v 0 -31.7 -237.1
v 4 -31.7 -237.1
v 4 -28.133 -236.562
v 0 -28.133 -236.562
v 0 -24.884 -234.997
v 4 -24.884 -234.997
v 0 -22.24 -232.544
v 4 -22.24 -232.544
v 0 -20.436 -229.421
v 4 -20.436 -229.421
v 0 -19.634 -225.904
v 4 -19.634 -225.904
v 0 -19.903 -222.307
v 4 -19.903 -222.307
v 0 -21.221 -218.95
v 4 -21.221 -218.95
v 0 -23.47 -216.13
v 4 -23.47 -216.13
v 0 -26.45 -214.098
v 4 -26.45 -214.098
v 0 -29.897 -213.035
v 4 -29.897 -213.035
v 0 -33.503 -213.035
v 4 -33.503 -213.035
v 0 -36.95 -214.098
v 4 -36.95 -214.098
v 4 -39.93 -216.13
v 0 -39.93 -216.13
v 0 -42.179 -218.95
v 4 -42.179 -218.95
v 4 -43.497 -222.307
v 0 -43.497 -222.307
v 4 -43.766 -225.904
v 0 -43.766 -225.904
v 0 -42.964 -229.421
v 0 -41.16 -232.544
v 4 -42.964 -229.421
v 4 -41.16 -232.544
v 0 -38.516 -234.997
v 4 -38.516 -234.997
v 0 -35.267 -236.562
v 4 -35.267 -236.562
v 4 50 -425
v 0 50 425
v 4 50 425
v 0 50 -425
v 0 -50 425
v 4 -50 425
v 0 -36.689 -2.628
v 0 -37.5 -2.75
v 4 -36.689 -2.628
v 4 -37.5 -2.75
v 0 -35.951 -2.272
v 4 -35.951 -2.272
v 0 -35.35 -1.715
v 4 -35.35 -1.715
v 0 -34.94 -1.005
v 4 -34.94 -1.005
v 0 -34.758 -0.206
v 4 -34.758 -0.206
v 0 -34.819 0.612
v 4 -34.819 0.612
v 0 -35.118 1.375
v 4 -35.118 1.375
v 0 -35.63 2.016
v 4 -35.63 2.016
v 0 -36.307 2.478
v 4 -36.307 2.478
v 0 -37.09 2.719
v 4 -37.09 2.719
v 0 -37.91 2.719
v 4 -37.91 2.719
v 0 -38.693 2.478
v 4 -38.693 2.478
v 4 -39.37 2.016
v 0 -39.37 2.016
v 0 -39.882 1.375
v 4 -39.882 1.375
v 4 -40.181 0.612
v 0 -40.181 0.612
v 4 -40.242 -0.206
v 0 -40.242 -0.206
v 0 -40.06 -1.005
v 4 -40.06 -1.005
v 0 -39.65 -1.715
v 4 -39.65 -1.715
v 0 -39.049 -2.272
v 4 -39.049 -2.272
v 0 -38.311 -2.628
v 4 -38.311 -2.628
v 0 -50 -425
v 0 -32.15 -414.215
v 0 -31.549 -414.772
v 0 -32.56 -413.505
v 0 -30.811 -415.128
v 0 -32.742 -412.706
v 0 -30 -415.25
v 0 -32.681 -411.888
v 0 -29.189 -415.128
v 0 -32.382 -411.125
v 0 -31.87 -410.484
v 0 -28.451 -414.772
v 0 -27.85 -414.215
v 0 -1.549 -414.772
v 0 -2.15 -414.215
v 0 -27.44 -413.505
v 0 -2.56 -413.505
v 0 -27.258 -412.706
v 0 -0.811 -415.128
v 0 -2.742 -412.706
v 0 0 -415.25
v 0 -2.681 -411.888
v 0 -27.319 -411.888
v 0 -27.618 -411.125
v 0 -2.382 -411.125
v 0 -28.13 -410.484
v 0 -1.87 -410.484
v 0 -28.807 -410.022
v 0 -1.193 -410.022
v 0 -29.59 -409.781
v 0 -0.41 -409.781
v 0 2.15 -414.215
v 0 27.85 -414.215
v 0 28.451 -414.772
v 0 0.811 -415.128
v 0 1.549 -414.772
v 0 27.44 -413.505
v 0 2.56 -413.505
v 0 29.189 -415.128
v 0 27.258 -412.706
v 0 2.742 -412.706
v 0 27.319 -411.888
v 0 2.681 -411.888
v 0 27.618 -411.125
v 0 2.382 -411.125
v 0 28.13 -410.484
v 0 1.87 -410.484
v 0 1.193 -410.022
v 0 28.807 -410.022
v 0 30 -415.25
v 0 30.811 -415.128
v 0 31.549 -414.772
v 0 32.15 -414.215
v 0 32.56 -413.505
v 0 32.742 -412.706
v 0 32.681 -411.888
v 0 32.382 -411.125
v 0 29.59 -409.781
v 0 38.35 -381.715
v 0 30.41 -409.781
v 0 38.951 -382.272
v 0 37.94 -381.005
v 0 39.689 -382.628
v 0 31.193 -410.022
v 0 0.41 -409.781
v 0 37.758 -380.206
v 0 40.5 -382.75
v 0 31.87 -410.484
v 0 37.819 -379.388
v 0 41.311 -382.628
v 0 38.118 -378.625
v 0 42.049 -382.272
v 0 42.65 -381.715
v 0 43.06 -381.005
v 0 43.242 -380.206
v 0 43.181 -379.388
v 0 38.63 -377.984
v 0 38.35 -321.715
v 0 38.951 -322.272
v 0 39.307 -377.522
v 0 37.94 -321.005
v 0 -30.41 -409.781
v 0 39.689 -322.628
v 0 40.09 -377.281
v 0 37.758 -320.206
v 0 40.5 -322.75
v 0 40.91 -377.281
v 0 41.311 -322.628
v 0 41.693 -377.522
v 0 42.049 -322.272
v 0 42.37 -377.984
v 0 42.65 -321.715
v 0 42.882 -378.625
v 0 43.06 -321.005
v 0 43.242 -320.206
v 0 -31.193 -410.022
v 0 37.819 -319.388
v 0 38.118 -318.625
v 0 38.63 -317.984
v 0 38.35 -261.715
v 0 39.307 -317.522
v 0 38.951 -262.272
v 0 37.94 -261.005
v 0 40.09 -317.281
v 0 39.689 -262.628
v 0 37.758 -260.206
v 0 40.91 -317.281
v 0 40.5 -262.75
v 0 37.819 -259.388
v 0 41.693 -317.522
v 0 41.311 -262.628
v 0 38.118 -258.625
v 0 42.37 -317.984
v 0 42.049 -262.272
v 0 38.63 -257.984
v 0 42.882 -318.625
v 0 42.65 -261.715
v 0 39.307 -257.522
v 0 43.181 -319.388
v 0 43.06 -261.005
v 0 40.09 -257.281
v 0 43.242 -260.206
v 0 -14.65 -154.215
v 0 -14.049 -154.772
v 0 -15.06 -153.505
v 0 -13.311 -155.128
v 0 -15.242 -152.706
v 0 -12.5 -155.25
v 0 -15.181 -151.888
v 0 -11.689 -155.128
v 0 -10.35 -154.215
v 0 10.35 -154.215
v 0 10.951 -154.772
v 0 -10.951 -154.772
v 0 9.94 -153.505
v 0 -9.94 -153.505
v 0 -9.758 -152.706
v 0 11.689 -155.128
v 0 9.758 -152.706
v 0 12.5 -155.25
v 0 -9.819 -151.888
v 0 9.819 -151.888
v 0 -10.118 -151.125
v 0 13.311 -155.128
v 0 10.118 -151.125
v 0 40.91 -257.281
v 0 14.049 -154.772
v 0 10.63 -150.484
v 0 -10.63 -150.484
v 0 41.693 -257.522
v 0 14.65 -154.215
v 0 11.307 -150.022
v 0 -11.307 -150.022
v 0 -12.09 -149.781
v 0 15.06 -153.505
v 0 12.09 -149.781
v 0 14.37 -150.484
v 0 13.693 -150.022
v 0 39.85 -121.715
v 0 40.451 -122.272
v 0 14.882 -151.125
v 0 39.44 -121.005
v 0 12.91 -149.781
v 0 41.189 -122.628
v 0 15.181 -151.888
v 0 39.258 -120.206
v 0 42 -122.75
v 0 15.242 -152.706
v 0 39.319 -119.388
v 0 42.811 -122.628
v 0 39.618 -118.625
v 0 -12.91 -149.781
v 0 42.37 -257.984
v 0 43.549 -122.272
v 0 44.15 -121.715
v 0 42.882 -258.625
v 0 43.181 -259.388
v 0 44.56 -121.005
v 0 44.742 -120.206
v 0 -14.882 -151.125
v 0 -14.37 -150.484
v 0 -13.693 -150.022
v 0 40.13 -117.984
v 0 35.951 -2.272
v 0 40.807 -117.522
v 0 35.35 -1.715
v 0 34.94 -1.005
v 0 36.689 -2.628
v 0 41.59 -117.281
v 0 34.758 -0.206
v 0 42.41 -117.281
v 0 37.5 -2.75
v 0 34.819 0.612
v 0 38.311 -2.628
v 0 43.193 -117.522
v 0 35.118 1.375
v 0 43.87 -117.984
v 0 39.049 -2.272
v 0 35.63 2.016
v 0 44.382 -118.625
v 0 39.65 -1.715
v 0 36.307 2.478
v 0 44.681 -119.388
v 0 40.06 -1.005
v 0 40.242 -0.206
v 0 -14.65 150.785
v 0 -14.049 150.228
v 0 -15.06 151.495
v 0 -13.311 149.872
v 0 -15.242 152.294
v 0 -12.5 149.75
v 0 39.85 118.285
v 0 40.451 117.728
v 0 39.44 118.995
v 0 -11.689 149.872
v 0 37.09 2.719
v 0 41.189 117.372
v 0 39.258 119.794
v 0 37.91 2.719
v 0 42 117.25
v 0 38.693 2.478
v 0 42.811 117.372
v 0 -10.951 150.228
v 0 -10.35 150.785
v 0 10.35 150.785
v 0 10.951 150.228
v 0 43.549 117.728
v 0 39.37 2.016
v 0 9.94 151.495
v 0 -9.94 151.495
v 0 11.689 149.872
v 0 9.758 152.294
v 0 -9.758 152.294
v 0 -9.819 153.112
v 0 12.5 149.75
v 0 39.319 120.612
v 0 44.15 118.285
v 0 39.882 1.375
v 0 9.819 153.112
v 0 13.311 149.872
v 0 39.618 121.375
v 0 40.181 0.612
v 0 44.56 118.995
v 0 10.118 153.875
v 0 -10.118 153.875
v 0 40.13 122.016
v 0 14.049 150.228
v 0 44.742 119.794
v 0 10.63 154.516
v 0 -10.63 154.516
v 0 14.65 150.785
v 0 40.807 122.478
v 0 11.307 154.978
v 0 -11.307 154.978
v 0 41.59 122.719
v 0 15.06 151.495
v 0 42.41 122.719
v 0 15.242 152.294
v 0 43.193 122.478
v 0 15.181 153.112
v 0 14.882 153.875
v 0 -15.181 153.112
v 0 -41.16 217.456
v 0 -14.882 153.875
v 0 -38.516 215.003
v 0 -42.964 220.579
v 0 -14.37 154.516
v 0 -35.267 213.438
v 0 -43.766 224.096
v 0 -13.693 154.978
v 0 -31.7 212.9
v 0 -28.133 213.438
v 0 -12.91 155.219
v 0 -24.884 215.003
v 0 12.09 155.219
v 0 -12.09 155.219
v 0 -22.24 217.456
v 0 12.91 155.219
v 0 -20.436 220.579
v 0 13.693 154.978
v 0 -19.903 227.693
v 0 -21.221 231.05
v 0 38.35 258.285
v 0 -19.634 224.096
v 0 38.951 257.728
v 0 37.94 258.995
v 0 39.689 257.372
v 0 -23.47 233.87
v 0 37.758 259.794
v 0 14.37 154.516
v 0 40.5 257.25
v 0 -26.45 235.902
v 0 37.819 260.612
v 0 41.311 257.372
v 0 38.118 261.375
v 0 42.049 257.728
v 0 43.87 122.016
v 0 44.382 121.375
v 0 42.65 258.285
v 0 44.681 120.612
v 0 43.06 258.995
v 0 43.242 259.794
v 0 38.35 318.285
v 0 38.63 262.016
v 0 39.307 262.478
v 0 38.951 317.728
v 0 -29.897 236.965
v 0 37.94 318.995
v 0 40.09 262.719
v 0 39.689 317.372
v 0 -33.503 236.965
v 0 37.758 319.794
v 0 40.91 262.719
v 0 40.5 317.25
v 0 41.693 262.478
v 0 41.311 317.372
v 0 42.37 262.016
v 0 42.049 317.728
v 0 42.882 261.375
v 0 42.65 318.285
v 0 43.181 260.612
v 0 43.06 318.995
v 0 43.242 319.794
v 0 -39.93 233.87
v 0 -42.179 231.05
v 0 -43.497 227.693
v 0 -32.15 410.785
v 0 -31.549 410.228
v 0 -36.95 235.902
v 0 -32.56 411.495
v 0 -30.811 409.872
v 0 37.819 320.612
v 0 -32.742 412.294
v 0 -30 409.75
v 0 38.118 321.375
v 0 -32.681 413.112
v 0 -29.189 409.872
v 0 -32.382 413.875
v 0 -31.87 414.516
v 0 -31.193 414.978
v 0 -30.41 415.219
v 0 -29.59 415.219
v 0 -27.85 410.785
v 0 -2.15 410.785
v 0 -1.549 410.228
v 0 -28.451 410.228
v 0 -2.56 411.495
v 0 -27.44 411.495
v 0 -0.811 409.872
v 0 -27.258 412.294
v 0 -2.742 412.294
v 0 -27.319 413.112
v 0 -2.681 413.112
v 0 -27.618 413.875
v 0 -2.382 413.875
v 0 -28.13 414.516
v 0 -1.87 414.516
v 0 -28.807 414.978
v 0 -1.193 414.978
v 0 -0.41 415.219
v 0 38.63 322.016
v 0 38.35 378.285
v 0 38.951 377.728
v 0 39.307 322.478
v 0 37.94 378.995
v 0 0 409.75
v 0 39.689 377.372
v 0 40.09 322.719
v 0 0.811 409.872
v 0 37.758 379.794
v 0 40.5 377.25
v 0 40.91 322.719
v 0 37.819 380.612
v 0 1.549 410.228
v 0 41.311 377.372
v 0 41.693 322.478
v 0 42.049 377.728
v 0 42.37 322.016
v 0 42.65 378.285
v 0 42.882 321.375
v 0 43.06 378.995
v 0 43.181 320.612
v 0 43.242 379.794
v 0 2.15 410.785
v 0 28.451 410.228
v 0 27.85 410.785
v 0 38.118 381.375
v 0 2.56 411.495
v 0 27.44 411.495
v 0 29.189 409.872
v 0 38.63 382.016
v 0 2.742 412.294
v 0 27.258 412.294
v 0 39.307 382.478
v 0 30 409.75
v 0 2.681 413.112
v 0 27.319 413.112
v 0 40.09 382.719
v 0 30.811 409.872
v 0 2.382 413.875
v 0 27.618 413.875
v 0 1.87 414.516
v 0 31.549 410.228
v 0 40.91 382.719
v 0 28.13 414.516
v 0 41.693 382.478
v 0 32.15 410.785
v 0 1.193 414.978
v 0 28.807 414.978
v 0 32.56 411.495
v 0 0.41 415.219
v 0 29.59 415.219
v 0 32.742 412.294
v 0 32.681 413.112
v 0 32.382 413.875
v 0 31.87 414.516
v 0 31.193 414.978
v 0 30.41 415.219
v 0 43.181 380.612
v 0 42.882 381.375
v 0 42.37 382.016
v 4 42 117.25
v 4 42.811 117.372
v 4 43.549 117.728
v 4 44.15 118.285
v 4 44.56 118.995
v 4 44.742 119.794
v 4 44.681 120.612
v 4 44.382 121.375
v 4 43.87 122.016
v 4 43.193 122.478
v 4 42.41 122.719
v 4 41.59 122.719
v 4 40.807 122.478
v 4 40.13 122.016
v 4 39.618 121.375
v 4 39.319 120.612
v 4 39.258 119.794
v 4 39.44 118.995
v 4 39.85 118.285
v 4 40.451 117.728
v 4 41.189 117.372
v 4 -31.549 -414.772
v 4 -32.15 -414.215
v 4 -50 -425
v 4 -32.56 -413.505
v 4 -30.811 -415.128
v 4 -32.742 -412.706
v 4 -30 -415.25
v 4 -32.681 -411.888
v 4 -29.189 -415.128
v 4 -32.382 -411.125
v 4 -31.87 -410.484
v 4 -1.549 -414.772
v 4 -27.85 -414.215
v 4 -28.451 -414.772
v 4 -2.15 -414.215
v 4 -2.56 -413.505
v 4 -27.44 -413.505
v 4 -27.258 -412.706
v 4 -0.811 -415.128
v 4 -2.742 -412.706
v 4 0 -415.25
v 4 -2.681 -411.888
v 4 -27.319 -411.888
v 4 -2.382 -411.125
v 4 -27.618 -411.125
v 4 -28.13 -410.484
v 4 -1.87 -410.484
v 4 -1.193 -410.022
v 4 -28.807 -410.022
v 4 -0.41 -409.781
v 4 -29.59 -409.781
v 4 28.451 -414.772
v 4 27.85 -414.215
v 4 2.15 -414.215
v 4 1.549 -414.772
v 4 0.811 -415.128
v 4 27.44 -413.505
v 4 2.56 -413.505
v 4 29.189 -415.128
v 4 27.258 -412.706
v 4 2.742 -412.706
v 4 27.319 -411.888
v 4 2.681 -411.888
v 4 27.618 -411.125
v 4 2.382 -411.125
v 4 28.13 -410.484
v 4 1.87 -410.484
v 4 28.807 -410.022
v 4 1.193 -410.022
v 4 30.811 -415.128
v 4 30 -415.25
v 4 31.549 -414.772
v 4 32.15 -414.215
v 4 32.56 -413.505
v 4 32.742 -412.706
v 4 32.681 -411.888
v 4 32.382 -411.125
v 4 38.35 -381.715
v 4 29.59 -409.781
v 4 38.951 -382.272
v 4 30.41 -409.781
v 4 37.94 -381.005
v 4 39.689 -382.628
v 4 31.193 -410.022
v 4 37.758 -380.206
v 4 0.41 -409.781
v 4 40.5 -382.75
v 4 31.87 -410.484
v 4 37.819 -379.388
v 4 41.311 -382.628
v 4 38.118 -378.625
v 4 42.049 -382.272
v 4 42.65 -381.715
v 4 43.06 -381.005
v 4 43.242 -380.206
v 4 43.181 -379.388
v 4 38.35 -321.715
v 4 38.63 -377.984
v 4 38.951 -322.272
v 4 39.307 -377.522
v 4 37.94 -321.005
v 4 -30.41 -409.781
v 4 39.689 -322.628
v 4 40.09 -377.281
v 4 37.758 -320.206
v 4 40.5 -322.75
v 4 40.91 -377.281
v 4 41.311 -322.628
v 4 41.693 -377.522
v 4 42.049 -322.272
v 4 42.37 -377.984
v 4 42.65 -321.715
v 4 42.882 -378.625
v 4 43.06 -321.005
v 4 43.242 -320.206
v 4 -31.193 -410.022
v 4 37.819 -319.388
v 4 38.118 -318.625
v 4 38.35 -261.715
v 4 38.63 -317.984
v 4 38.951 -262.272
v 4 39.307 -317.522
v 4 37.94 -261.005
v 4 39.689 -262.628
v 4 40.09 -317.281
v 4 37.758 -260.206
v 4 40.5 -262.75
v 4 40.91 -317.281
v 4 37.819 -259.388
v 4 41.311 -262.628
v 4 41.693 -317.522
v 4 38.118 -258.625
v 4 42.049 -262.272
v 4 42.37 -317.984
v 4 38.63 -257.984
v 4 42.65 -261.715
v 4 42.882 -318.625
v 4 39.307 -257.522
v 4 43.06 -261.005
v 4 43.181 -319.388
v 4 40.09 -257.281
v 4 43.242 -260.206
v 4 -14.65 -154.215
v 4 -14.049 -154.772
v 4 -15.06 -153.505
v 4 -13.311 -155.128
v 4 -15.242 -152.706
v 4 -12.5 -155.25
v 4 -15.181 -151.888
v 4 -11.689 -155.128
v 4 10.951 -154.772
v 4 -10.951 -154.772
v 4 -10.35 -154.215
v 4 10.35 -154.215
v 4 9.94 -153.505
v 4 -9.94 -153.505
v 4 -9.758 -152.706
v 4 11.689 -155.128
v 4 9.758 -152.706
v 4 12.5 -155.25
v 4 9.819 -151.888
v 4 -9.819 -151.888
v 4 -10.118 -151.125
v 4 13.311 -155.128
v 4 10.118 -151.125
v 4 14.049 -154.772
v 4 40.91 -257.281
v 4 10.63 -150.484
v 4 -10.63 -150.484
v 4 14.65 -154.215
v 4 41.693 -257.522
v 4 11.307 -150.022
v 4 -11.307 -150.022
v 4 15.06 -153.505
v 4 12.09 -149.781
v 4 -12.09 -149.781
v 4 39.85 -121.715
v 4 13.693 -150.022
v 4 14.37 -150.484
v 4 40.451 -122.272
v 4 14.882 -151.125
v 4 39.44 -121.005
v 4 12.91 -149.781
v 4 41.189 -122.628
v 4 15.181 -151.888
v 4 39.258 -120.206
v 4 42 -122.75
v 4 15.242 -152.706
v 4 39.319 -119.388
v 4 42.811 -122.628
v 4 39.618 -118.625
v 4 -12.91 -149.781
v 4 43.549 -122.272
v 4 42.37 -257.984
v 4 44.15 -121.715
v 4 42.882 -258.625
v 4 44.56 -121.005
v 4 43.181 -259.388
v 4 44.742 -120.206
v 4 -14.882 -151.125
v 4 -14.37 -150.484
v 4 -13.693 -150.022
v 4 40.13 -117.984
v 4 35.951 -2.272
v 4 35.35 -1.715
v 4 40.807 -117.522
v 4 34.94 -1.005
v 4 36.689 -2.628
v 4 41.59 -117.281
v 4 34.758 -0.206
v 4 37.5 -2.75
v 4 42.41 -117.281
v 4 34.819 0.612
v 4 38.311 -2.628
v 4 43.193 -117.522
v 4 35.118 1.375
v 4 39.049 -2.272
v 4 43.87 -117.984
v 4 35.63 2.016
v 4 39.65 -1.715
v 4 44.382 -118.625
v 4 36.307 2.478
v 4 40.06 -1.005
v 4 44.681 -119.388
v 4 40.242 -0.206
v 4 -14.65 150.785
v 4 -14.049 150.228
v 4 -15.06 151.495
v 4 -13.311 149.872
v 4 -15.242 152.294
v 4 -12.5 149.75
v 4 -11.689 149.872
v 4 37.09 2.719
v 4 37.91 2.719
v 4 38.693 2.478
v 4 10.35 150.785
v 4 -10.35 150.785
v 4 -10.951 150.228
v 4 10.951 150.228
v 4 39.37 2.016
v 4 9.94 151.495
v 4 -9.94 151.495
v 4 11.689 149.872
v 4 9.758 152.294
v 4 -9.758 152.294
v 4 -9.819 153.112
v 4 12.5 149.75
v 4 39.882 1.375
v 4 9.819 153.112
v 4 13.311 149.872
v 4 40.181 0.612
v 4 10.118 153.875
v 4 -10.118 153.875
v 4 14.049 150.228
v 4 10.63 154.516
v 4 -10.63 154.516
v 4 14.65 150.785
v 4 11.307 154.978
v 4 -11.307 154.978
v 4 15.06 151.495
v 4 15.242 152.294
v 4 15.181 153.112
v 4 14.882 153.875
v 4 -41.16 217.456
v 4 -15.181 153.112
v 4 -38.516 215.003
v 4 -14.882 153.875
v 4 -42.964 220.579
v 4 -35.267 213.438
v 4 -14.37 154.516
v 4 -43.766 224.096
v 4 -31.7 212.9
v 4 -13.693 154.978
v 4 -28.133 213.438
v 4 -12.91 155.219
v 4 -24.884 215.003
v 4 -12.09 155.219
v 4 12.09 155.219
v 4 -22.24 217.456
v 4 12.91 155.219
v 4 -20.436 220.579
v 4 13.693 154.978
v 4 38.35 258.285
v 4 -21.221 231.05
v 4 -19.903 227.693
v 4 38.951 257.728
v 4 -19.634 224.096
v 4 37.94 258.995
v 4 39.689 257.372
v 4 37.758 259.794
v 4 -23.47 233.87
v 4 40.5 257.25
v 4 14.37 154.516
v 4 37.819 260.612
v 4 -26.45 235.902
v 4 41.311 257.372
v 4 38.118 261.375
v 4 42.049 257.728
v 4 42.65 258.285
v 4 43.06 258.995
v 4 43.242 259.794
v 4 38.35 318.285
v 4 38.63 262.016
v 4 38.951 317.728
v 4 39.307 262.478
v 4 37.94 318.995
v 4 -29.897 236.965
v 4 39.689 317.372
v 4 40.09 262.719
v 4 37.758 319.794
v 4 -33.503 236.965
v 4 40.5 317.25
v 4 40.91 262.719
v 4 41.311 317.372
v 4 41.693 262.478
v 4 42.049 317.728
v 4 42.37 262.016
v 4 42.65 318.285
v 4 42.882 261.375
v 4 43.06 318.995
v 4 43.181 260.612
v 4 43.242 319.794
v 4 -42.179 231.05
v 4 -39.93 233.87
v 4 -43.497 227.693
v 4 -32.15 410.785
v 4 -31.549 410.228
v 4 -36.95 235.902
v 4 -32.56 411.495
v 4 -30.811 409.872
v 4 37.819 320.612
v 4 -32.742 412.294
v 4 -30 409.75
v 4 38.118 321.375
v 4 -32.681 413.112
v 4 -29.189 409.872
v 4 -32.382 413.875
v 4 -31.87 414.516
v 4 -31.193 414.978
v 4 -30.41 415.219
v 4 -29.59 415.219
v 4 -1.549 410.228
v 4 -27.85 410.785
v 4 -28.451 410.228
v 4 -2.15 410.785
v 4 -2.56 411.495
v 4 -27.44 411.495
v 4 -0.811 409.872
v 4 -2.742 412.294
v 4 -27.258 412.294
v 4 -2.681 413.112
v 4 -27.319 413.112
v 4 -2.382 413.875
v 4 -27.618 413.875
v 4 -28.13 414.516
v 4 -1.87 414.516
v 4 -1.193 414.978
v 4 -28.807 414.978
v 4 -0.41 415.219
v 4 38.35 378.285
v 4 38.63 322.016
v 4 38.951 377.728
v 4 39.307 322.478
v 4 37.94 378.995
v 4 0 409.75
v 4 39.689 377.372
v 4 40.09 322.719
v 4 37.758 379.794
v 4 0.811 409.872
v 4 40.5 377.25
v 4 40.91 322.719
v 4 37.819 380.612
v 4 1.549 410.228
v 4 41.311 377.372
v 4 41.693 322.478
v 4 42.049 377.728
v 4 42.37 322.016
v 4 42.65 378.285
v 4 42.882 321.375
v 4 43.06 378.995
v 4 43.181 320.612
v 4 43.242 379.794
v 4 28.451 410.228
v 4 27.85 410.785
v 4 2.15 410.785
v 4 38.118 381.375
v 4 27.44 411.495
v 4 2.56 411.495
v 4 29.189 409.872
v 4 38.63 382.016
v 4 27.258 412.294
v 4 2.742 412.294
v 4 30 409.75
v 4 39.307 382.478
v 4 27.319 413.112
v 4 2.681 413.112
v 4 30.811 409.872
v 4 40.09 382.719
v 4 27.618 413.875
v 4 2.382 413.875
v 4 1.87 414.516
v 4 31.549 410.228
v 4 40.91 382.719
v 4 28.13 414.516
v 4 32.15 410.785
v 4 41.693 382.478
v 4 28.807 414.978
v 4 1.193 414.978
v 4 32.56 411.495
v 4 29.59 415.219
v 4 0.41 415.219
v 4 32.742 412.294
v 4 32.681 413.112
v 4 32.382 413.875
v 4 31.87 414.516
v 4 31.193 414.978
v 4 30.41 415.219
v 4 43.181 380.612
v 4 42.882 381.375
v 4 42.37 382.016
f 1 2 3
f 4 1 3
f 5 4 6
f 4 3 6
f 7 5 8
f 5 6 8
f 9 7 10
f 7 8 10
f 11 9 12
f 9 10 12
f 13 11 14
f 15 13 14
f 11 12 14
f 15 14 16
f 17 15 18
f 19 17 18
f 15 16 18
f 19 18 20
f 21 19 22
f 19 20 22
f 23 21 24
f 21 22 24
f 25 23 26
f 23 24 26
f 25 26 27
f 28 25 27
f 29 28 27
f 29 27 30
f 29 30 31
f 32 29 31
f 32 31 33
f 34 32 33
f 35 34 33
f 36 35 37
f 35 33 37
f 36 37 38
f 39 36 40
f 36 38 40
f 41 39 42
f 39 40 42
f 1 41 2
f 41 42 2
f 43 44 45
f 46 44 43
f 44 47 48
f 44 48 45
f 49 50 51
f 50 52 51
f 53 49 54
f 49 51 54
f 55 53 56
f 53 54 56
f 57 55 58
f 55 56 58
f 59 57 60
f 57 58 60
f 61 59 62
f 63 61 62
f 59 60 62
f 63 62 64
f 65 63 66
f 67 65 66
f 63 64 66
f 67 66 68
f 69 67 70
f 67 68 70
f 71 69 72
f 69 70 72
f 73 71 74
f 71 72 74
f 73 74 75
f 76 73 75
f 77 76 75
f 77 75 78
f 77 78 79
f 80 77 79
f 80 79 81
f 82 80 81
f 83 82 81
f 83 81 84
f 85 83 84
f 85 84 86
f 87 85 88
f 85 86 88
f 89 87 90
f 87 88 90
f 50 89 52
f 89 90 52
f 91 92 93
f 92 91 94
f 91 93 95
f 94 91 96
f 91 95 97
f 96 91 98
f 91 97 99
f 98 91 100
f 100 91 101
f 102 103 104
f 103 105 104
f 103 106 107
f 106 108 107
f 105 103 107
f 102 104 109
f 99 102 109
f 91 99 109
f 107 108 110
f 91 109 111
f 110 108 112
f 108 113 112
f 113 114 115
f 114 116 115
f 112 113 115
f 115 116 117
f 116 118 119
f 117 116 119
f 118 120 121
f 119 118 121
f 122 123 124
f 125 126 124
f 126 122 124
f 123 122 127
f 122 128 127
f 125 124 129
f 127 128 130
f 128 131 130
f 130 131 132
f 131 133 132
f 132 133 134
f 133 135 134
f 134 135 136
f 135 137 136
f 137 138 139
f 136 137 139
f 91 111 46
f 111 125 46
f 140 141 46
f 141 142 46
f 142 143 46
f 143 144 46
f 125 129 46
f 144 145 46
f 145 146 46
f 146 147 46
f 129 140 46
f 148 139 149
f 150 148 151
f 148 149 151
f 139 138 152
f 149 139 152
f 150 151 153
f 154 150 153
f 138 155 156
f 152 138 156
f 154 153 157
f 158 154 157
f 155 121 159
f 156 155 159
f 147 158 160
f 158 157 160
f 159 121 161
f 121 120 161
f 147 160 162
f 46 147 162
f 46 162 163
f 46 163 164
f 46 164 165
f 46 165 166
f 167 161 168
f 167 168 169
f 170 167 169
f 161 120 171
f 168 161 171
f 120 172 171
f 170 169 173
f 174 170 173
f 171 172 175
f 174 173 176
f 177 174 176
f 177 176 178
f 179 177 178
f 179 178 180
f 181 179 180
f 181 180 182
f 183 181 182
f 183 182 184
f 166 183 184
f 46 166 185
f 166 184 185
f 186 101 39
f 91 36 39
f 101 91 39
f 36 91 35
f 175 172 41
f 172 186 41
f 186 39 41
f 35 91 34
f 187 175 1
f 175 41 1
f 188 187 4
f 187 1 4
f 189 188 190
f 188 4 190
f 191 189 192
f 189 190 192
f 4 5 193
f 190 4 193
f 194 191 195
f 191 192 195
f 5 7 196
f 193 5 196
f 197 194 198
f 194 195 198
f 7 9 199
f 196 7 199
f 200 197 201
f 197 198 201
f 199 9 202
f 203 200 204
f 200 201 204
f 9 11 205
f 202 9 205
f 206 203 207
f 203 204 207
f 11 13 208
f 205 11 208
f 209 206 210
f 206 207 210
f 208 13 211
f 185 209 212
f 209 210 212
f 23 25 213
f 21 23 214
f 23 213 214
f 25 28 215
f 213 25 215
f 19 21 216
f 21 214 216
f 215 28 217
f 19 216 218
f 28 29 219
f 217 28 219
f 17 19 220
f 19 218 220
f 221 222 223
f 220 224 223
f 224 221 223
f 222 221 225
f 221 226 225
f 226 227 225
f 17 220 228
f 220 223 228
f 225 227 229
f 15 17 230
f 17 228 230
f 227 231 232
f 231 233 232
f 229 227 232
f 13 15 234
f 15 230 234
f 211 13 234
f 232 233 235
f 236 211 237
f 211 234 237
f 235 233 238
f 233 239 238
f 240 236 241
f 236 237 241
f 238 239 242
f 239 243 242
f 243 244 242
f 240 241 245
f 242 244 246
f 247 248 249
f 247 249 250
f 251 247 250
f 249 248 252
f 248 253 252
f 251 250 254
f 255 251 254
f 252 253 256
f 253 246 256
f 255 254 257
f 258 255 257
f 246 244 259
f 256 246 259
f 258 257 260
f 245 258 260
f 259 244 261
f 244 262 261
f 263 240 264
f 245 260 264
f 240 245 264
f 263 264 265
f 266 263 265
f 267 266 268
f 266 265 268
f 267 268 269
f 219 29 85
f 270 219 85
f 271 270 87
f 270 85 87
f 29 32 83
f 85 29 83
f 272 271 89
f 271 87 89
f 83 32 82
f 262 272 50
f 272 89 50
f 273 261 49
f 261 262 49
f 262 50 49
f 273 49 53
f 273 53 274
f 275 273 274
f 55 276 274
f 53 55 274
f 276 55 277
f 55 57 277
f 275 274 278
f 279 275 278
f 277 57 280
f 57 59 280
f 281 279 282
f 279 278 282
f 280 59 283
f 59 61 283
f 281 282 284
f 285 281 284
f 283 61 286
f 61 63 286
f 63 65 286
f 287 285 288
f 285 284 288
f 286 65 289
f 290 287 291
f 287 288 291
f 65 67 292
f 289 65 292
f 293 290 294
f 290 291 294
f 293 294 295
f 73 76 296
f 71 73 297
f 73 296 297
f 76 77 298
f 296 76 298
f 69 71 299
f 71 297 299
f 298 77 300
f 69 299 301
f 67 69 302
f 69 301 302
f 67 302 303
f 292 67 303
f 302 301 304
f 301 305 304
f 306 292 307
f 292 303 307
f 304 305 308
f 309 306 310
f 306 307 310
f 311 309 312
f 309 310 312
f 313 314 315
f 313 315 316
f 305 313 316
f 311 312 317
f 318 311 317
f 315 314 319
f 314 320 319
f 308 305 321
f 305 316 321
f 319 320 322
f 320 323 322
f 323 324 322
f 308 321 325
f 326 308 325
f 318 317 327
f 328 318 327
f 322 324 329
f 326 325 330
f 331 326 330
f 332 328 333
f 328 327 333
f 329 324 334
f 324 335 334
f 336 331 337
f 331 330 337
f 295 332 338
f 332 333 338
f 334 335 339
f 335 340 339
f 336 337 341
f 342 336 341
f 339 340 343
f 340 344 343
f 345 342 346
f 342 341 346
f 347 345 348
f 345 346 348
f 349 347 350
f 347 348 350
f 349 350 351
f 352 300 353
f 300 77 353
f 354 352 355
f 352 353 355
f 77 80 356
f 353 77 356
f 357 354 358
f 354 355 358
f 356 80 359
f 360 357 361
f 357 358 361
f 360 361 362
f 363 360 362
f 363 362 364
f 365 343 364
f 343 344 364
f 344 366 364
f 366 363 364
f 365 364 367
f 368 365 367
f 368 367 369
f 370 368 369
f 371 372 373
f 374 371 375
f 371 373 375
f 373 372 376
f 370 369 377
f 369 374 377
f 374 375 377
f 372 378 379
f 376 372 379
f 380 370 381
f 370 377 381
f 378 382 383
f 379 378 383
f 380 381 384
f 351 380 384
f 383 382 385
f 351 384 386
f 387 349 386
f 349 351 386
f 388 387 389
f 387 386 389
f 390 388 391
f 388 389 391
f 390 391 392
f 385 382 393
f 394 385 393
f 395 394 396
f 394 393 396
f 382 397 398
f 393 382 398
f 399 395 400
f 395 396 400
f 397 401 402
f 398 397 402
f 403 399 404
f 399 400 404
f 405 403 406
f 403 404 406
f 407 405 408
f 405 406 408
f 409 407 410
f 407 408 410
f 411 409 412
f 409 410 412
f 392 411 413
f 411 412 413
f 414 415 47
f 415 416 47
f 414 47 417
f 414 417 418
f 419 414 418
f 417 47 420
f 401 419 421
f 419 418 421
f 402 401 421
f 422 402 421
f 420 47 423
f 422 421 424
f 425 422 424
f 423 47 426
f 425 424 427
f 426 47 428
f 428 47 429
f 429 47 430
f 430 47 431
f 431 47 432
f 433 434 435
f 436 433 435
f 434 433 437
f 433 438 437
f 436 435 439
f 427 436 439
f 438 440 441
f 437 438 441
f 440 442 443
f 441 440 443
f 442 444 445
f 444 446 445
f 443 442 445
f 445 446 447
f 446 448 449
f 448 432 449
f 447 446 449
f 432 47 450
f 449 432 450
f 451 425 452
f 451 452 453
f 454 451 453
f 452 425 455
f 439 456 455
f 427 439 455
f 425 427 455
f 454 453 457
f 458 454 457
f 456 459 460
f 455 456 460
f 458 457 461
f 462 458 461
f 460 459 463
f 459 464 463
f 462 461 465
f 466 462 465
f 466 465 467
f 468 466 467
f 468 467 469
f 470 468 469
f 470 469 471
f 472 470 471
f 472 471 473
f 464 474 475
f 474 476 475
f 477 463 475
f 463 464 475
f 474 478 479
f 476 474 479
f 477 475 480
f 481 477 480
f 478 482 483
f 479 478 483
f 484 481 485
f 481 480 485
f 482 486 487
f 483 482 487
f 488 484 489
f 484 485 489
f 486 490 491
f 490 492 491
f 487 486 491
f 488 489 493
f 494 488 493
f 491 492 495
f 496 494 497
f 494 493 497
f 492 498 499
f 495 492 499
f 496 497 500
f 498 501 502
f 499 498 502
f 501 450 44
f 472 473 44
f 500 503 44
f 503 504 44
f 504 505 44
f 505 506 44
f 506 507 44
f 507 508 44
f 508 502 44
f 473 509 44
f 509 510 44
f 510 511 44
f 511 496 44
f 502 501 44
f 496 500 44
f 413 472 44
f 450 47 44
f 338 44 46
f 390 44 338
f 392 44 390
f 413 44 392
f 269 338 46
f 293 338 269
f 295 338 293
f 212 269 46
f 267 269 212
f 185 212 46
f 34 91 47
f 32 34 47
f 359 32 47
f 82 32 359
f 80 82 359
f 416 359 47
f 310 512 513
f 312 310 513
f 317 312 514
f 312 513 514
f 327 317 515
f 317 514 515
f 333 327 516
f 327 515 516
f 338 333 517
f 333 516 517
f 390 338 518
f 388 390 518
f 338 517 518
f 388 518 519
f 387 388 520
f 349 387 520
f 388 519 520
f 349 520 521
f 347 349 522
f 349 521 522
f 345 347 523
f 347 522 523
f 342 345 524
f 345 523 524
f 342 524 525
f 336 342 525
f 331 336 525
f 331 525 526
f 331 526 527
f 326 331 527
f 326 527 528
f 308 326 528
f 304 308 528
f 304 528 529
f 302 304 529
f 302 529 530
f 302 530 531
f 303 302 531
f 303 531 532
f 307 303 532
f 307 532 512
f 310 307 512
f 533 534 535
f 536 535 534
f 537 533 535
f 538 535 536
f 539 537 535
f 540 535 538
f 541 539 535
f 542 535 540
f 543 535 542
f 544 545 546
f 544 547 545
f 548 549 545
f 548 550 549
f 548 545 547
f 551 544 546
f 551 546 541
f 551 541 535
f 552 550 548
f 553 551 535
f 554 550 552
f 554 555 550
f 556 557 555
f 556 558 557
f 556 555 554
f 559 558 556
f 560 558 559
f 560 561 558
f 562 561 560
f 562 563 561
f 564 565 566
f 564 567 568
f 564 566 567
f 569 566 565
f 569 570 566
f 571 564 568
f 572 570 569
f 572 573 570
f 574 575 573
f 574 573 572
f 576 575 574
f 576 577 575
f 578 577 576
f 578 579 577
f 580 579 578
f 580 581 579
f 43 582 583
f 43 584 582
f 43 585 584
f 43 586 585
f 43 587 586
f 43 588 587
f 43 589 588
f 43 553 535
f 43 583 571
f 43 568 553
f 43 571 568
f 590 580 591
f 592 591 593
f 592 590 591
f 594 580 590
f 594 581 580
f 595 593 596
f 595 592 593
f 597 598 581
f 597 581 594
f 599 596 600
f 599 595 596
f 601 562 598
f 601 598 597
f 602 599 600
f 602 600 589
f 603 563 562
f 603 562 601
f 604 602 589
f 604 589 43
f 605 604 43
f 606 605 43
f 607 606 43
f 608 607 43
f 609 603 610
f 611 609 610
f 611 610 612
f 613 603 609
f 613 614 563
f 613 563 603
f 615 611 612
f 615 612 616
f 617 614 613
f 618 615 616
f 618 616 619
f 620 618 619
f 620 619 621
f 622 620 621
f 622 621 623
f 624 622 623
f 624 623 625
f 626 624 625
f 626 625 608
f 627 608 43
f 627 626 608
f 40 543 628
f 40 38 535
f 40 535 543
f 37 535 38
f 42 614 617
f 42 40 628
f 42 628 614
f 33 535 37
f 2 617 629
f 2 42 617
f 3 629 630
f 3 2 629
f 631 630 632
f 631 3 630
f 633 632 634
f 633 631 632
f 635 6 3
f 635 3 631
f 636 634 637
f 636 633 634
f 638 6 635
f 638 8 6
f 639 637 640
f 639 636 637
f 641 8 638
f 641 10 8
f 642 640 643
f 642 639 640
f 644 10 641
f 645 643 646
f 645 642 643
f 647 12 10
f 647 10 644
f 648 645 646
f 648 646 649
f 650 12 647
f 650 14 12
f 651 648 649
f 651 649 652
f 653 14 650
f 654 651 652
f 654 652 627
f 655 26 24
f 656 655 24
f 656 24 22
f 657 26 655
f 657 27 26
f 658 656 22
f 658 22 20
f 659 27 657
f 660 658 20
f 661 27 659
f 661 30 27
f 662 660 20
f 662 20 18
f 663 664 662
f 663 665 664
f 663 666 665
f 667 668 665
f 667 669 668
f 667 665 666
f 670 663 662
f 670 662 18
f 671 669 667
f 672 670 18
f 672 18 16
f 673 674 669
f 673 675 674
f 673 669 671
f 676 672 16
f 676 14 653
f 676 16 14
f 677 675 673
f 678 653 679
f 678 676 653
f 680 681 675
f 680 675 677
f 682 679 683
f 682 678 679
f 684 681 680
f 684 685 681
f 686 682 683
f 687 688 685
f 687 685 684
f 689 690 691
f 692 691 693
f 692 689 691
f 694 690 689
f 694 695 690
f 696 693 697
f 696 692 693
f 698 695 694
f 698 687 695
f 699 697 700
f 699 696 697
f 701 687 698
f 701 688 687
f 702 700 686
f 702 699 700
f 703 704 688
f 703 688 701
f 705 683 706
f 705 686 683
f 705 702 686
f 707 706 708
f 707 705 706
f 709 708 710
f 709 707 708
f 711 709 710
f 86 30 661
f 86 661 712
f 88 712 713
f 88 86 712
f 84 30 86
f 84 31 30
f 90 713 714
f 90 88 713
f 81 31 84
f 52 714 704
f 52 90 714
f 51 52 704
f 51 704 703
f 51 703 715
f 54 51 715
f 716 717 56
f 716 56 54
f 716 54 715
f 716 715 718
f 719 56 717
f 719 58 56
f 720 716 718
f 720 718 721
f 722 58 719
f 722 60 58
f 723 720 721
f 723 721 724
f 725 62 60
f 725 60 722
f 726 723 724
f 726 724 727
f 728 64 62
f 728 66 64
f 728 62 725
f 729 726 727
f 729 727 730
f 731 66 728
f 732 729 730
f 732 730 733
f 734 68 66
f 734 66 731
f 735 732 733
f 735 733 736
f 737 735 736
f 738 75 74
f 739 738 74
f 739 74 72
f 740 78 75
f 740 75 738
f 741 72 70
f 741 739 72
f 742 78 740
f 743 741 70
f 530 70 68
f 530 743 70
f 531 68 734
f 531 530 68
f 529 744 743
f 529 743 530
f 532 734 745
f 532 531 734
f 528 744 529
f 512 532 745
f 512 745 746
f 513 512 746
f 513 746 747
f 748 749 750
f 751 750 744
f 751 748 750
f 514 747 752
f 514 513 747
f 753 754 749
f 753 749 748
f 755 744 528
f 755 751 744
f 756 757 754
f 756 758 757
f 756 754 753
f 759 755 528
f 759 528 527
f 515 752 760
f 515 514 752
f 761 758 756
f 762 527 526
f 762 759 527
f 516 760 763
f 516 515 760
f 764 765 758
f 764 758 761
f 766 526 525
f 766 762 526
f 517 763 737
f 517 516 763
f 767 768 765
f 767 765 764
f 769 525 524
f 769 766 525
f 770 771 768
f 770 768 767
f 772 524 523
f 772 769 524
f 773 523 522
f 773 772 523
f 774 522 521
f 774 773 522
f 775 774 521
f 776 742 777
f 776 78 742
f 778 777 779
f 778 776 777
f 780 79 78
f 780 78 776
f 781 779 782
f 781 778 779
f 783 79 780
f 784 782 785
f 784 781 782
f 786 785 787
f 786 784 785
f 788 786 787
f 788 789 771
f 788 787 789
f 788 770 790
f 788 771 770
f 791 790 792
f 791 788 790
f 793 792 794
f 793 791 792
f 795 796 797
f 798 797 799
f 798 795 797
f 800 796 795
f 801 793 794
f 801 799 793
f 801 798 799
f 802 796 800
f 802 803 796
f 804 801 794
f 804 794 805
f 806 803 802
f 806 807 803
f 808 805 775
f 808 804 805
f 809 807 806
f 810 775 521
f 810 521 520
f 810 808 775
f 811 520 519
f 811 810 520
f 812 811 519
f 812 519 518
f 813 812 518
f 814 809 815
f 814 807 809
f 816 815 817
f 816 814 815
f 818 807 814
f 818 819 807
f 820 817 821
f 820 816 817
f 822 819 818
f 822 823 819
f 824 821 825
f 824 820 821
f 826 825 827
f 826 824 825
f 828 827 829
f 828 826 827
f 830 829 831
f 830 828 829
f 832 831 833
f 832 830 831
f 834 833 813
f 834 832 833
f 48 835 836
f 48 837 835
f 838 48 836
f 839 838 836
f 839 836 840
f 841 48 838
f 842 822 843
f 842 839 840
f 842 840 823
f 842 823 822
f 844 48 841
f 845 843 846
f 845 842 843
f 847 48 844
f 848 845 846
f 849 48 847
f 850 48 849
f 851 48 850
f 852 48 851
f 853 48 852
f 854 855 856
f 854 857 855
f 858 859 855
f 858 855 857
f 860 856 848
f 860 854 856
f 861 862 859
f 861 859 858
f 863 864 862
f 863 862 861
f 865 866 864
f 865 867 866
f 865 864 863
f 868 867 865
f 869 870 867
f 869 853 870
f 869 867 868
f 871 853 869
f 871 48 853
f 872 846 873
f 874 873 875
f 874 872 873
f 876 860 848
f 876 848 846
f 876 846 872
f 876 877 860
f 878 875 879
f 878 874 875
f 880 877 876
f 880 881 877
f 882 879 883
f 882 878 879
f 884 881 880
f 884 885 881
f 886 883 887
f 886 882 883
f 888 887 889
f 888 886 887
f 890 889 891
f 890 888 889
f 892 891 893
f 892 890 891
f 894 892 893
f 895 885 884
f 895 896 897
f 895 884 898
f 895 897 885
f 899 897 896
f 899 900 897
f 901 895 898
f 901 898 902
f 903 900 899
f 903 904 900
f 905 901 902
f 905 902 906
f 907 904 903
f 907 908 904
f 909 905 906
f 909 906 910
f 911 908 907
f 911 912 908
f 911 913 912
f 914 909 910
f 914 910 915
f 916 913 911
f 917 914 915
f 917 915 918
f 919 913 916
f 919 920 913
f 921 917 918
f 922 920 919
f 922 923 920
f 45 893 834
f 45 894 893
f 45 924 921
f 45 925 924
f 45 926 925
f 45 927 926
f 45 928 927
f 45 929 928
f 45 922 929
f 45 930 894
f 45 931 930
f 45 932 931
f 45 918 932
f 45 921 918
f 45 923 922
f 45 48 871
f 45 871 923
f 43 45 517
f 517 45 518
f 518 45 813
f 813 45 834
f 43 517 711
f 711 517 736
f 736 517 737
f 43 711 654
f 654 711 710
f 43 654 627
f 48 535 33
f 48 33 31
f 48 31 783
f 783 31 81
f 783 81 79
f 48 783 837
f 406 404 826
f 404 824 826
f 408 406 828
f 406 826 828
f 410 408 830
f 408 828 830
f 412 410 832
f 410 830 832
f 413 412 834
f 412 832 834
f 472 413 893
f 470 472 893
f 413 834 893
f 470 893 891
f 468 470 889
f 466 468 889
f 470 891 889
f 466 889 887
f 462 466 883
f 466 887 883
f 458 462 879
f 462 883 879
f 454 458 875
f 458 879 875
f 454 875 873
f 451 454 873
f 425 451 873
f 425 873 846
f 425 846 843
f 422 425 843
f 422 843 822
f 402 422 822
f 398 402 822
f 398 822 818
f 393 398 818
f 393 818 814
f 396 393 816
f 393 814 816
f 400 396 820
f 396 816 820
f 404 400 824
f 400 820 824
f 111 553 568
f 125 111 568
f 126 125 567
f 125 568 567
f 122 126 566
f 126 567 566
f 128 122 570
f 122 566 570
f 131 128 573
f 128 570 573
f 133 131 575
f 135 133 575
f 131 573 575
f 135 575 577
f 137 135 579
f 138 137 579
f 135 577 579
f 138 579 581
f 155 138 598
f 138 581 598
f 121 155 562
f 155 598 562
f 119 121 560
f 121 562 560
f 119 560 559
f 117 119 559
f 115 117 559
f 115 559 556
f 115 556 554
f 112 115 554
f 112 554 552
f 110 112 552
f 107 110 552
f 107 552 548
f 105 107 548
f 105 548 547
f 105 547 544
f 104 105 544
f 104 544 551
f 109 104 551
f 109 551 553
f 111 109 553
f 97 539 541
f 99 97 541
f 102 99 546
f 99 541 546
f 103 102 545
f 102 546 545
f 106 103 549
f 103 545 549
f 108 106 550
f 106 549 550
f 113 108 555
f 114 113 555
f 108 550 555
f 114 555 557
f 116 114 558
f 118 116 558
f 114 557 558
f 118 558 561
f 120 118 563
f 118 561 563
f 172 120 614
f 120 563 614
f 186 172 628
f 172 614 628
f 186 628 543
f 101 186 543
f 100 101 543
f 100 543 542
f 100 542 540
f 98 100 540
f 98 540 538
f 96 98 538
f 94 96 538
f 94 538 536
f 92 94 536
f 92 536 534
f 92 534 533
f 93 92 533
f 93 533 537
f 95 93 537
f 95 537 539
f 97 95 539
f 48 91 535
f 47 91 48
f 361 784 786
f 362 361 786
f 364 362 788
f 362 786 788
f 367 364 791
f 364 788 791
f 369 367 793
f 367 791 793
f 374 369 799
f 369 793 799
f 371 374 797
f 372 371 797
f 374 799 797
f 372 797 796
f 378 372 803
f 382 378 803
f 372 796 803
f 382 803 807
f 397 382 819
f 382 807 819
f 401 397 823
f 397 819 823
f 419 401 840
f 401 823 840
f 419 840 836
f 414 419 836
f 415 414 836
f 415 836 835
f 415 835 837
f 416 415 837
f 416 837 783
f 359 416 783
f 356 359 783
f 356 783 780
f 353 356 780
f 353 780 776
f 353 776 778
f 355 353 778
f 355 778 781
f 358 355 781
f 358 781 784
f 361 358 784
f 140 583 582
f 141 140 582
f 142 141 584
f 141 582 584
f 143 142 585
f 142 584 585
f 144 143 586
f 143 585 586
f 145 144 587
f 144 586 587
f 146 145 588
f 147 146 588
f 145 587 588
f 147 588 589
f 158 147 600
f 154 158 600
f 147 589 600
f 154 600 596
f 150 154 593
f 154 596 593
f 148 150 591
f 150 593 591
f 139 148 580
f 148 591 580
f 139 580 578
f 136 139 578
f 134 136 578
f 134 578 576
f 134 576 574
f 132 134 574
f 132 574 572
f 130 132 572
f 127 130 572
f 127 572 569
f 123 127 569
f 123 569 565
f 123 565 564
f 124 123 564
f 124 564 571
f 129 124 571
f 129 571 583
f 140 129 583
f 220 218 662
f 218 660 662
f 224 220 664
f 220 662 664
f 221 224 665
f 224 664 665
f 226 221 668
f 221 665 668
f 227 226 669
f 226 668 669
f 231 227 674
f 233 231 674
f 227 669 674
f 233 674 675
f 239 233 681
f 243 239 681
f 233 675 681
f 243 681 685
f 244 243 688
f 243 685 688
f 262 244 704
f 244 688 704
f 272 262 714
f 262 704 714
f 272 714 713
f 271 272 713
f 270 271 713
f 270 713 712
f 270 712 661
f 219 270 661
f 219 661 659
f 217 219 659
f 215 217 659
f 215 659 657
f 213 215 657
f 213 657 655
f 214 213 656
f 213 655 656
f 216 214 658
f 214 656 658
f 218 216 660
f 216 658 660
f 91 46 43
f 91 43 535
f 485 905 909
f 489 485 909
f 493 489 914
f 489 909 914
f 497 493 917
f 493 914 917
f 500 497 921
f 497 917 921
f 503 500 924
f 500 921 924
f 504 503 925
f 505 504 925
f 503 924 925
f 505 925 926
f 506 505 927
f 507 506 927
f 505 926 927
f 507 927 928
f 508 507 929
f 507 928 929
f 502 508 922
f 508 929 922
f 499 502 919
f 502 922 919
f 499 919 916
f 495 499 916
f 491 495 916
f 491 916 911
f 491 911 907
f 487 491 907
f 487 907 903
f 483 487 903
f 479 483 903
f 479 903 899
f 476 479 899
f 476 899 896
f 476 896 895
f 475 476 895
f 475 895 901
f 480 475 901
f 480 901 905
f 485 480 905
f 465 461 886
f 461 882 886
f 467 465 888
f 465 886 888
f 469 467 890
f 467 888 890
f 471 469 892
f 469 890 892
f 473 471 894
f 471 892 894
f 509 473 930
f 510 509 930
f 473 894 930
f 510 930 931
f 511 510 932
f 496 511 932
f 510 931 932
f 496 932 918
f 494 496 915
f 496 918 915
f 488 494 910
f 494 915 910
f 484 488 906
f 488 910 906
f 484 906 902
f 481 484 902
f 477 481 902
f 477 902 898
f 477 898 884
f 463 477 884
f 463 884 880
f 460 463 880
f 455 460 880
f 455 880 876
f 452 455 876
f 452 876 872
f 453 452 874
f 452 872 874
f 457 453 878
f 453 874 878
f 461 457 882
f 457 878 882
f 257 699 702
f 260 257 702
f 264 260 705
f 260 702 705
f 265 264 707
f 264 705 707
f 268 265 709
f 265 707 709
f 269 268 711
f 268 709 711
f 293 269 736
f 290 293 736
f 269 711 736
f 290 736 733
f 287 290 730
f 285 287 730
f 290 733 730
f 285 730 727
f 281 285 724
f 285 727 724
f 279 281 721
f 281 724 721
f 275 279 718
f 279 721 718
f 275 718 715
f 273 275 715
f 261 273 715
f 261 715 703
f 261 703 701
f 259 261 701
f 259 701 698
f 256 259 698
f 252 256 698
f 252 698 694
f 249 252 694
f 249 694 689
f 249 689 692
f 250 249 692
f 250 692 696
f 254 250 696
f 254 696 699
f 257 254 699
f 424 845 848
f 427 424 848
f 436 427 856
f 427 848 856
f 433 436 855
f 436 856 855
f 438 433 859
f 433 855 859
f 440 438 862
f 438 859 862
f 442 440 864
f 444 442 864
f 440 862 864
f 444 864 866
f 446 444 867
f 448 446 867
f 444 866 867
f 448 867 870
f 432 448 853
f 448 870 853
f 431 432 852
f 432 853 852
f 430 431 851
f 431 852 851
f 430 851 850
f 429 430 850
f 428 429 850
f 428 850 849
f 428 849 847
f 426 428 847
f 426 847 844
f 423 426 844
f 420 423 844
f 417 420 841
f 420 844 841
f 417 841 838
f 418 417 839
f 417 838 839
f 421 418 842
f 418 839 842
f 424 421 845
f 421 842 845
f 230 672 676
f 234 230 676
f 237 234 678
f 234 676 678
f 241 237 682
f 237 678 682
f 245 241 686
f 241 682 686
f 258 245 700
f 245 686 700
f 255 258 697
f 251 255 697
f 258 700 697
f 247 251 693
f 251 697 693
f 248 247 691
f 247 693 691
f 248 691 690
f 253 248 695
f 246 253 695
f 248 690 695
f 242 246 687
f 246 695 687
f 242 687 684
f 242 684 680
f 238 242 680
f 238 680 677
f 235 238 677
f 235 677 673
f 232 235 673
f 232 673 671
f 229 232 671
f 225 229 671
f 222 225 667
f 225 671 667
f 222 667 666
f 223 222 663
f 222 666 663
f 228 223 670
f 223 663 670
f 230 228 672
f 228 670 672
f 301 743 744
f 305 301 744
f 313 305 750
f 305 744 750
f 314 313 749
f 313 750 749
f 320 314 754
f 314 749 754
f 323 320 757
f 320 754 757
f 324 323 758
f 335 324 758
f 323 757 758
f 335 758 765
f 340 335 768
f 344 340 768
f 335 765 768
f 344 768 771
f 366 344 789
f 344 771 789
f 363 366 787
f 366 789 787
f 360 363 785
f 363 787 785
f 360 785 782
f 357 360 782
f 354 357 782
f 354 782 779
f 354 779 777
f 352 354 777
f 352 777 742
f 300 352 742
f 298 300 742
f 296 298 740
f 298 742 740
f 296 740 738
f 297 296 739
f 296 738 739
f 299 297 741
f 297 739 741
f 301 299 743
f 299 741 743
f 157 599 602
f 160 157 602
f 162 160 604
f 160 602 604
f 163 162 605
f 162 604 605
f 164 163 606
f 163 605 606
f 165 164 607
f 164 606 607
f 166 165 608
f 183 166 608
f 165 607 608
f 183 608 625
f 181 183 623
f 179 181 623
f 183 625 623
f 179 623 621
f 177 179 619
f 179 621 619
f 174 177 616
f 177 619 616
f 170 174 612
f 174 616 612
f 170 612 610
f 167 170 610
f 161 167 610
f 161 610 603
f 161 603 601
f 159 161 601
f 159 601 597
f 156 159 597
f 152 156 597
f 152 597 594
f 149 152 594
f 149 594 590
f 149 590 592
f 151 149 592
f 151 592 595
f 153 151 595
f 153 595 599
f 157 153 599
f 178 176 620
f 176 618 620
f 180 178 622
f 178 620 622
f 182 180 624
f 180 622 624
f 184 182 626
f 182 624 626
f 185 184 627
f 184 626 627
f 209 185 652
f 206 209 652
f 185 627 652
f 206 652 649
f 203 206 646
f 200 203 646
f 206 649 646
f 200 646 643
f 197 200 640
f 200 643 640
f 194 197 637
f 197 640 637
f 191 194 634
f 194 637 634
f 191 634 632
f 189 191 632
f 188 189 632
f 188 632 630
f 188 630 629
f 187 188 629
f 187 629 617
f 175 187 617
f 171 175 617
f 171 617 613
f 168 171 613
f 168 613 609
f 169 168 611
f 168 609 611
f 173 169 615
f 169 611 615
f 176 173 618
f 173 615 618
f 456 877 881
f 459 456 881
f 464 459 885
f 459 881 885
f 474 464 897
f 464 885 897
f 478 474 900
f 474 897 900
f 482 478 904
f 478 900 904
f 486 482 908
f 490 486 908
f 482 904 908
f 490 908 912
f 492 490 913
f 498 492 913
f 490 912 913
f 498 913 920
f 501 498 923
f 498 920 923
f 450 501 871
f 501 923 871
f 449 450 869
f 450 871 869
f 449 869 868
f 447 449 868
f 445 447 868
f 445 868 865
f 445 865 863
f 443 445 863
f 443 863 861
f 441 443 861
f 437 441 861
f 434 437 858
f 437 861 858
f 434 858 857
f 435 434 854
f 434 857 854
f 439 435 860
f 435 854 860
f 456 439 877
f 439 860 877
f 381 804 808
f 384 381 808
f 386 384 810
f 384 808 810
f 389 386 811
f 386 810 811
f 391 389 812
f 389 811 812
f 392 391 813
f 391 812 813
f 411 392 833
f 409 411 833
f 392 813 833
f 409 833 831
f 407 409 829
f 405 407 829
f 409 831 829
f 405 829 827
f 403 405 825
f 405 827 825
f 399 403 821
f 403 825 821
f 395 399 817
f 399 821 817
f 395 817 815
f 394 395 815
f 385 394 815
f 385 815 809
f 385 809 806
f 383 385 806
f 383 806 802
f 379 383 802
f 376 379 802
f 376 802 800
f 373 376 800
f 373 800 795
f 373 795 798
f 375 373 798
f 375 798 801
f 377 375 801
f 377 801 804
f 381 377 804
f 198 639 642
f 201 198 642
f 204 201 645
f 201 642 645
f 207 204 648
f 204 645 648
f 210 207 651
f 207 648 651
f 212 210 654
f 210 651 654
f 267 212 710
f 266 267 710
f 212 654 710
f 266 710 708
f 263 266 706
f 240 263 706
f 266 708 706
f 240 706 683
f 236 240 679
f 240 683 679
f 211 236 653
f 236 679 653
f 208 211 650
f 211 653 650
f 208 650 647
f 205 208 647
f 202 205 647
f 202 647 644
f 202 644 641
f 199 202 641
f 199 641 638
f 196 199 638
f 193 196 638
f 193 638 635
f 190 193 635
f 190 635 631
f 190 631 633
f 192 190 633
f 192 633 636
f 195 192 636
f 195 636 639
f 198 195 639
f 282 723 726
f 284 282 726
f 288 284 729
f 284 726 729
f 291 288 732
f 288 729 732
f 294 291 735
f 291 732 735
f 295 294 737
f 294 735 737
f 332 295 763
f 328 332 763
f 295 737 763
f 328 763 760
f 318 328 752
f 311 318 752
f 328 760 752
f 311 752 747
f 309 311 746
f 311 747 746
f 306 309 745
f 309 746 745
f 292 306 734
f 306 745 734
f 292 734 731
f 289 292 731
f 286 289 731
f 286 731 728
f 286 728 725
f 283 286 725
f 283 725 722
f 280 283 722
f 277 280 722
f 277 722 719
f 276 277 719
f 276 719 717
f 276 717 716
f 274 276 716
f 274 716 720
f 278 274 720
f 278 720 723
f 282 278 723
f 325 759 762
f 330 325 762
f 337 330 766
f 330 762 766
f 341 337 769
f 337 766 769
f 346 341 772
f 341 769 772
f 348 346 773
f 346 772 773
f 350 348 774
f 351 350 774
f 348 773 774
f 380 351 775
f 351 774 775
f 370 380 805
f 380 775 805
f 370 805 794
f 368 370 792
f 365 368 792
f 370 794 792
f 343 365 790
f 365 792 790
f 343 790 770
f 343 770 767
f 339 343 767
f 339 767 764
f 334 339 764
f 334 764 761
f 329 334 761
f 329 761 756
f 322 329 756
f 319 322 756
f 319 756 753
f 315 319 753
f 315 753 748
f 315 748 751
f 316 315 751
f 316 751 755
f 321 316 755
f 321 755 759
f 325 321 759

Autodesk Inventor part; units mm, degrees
ref_plane "YZ Plane" through (0, 0, 0) normal (1, 0, 0) x (0, 1, 0)
ref_plane "XZ Plane" through (0, 0, 0) normal (0, 1, 0) x (-1, 0, 0)
ref_plane "XY Plane" through (0, 0, 0) normal (0, 0, 1) x (1, 0, 0)
sketch "Sketch1" plane through (0, 0, 0) normal (1, 0, 0) x (0, 1, 0)
  line L0 (-50, 425) -> (50, 425)
  line L1 (50, 425) -> (50, -425)
  line L2 (50, -425) -> (-50, -425)
  line L3 (-50, -425) -> (-50, 425)
  line L4 (-50, 425) -> (50, -425) construction
  line L5 (50, 425) -> (-50, -425) construction
  point P0 (0, 0)
  dimension "d0" = 100
  dimension "d1" = 850
extrude "Extrusion1" add sketch "Sketch1" along normal blind 4
sketch "Sketch2" plane through (4, 0, 0) normal (1, 0, 0) x (0, 0, -1)
  circle A0 centre (-225, -31.7) radius 12.1
  line L0 (-425, -50) -> (425, -50) projected
  line L1 (-425, 50) -> (-425, -50) projected
  line L2 (425, 50) -> (-425, 50) projected
  line L3 (0, 50) -> (0, -50)
  circle A1 centre (225, -31.7) radius 12.1
  point P0 (0, 0)
  dimension "d4" = 18.3
  dimension "d5" = 200
  dimension "d6" = 24.2
  dimension "d9" = 425
extrude "Extrusion2" cut sketch "Sketch2" against normal through all contours A0 | A1
sketch "Sketch3" plane through (4, 0, 0) normal (1, 0, 0) x (0, 0, -1)
  circle A0 centre (120, -42) radius 2.75 projected
  circle A1 centre (120, 42) radius 2.75 projected
  circle A2 centre (0, 37.5) radius 2.75 projected
  circle A3 centre (412.5, 30) radius 2.75 projected
  circle A4 centre (412.5, 0) radius 2.75 projected
  circle A5 centre (412.5, -30) radius 2.75 projected
  circle A6 centre (260, 40.5) radius 2.75 projected
  circle A7 centre (320, 40.5) radius 2.75 projected
  circle A8 centre (145.213, 6.296) radius 10.5 projected
  circle A9 centre (196.913, 6.296) radius 10.5 projected
  circle A10 centre (-145.213, 6.296) radius 10.5 projected
  circle A11 centre (-196.913, 6.296) radius 10.5 projected
  circle A12 centre (-105, -14) radius 10 projected
  circle A13 centre (-79.6, -14) radius 2.75 projected
  circle A14 centre (-130.4, -14) radius 2.75 projected
  circle A15 centre (-264.9997, -22.6996) radius 2.75 projected
  circle A16 centre (-147.163, -33.4172) radius 2.75 projected
  circle A17 centre (264.9997, -22.6996) radius 2.75 projected
  circle A18 centre (174.913, 42.776) radius 2.75 projected
  circle A19 centre (147.163, -33.4172) radius 2.75 projected
  circle A20 centre (130.4, -14) radius 2.75 projected
  circle A21 centre (79.6, -14) radius 2.75 projected
  circle A22 centre (105, 11.4) radius 2.75 projected
  circle A23 centre (105, -39.4) radius 2.75 projected
  circle A24 centre (111.5777, 29.8129) radius 2.75 projected
  circle A25 centre (236.913, 19.219) radius 2.75 projected
  circle A26 centre (-236.913, 19.219) radius 2.75 projected
  circle A27 centre (-174.913, 42.776) radius 2.75 projected
  circle A28 centre (-111.5777, 29.8129) radius 2.75 projected
  circle A29 centre (-105, 11.4) radius 2.75 projected
  circle A30 centre (-105, -39.4) radius 2.75 projected
  circle A31 centre (241, -31.7) radius 2.25 projected
  circle A32 centre (-241, -31.7) radius 2.25 projected
  circle A33 centre (-209, -31.7) radius 2.25 projected
  circle A34 centre (-225, -15.7) radius 2.25 projected
  circle A35 centre (225, -15.7) radius 2.25 projected
  circle A36 centre (209, -31.7) radius 2.25 projected
  circle A37 centre (-225, -31.7) radius 12.3 projected
  circle A38 centre (225, -31.7) radius 12.3 projected
  line L0 (-425, 50) -> (-425, -50) projected
  line L1 (-425, 50) -> (425, 50) projected
  line L2 (425, -50) -> (425, 50) projected
  line L3 (-425, -50) -> (425, -50) projected
  circle A39 centre (-152.5, 12.5) radius 2.75 projected
  circle A40 centre (152.5, 12.5) radius 2.75 projected
  circle A41 centre (152.5, -12.5) radius 2.75 projected
  circle A42 centre (-152.5, -12.5) radius 2.75 projected
  circle A43 centre (0, -37.5) radius 2.75 projected
  circle A44 centre (320, 40.5) radius 2.75 projected
  circle A45 centre (260, 40.5) radius 2.75 projected
  circle A46 centre (0, 37.5) radius 2.75 projected
  circle A47 centre (120, 42) radius 2.75 projected
  circle A48 centre (380, 40.5) radius 2.75 projected
  circle A49 centre (412.5, 0) radius 2.75 projected
  circle A50 centre (412.5, -30) radius 2.75 projected
  circle A51 centre (-264.9997, -22.6996) radius 2.75 projected
  circle A52 centre (-147.163, -33.4172) radius 2.75 projected
  circle A53 centre (264.9997, -22.6996) radius 2.75 projected
  circle A54 centre (174.913, 42.776) radius 2.75 projected
  circle A55 centre (147.163, -33.4172) radius 2.75 projected
  circle A56 centre (111.5777, 29.8129) radius 2.75 projected
  circle A57 centre (236.913, 19.219) radius 2.75 projected
  circle A58 centre (-236.913, 19.219) radius 2.75 projected
  circle A59 centre (-174.913, 42.776) radius 2.75 projected
  circle A60 centre (-111.5777, 29.8129) radius 2.75 projected
  circle A61 centre (225, -31.7) radius 16.3 projected
  circle A62 centre (-225, -31.7) radius 16.3 projected
  line L4 (-425, -50) -> (-425, 50) projected
  line L5 (-425, -50) -> (425, -50) projected
  line L6 (425, 50) -> (425, -50) projected
  line L7 (-425, 50) -> (425, 50) projected
  circle A63 centre (-120, 42) radius 2.75 projected
  circle A64 centre (-105, -14) radius 34 projected
  circle A65 centre (75.0667, -42) radius 2.75 projected
  circle A66 centre (105, -14) radius 34 projected
  circle A67 centre (152.5, -12.5) radius 7.5 projected
  circle A68 centre (-152.5, -12.5) radius 7.5 projected
  circle A69 centre (-85.6, 40) radius 2.75 projected
  circle A70 centre (15.6, 40) radius 2.75 projected
  circle A71 centre (364.4, 40) radius 2.75 projected
  circle A72 centre (364.5, -40) radius 2.75 projected
  circle A73 centre (15.6, -40) radius 2.75 projected
  circle A74 centre (-85.6, -40) radius 2.75 projected
  arc A75 (-119.576, -44.7171) -> (-92.3554, -45.5613) centre (-105, -14) ccw projected
  circle A76 centre (15.6, -40) radius 8.75 projected
  circle A77 centre (-85.6, 40) radius 8.75 projected
  circle A78 centre (15.6, 40) radius 8.75 projected
  circle A79 centre (364.5, -40) radius 8.75 projected
  arc A80 (-92.3554, -45.5613) -> (-78.3455, -35.1077) centre (-85.6, -40) ccw projected
  circle A81 centre (105, -14) radius 10 projected
  circle A82 centre (0, 0) radius 25 projected
  circle A83 centre (0, 0) radius 25 projected
  arc A84 (119.576, -44.7171) -> (122.4969, -43.1523) centre (120, -42) ccw projected
  arc A85 (122.4969, -43.1523) -> (119.576, -44.7171) centre (105, -14) ccw projected
  arc A86 (-78.3455, -35.1077) -> (-122.4969, -43.1523) centre (-105, -14) ccw projected
  circle A87 centre (412.5, 30) radius 2.75 projected
  circle A88 centre (412.5, 30) radius 2.75 projected
  circle A89 centre (364.4, 40) radius 8.75 projected
  circle A90 centre (364.4, 40) radius 8.75 projected
  circle A91 centre (0, -37.5) radius 7.75 projected
  circle A92 centre (380, 40.5) radius 6.75 projected
  circle A93 centre (-412.5, 0) radius 2.75 projected
  circle A94 centre (-380, 40.5) radius 2.75 projected
  circle A95 centre (-260, 40.5) radius 2.75 projected
  circle A96 centre (-320, 40.5) radius 2.75 projected
  circle A97 centre (-412.5, 30) radius 2.75 projected
  circle A98 centre (-412.5, -30) radius 2.75 projected
  circle A99 centre (-120, -42) radius 2.75 projected
  arc A100 (-122.4969, -43.1523) -> (-119.576, -44.7171) centre (-120, -42) ccw projected
  circle A101 centre (-412.5, -30) radius 2.75 projected
  circle A102 centre (-412.5, 30) radius 2.75 projected
  circle A103 centre (-320, 40.5) radius 2.75 projected
  circle A104 centre (-260, 40.5) radius 2.75 projected
  circle A105 centre (-380, 40.5) radius 2.75 projected
  circle A106 centre (-412.5, 0) radius 2.75 projected
  circle A107 centre (-120, 42) radius 2.75 projected
  point P0 (0, 0)
  point P1 (72.4969, -43.1523)
  point P2 (69.576, -44.7171)
  point P3 (369.0669, 32.5985)
  point P4 (365.7758, 31.3588)
  point P5 (368.1667, 30)
  point P6 (-105, -14)
  point P7 (-105, -14)
  point P8 (105, -14)
  point P9 (-105, -14)
  point P10 (-105, -14)
extrude "Extrusion3" cut sketch "Sketch3" against normal blind 10 contours A1 | A2 | A4 | A5 | A6 | A7 | A40 A8 | A8 A40 | A39 A10 | A10 A39 | A41 | A42 | A43 picked at (152.3295, 12.2121) picked at (153.6603, 13.4669) picked at (-152.2792, 12.2624) picked at (-153.718, 13.3887)
sketch "Sketch4" plane through (4, 0, 0) normal (1, 0, 0) x (0, 0, -1)
  circle A0 centre (120, 42) radius 2.75 projected
  circle A1 centre (0, 37.5) radius 2.75 projected
  circle A2 centre (-120, 42) radius 2.75 projected
  circle A3 centre (152.5, 12.5) radius 2.75 projected
  circle A4 centre (152.5, -12.5) radius 2.75 projected
  circle A5 centre (-152.5, 12.5) radius 2.75 projected
  circle A6 centre (-152.5, -12.5) radius 2.75 projected
  circle A7 centre (-412.5, 30) radius 2.75 projected
  circle A8 centre (-412.5, 0) radius 2.75 projected
  circle A9 centre (-412.5, -30) radius 2.75 projected
  circle A10 centre (412.5, 30) radius 2.75 projected
  circle A11 centre (412.5, 0) radius 2.75 projected
  circle A12 centre (412.5, -30) radius 2.75 projected
  circle A13 centre (380, 40.5) radius 2.75 projected
  circle A14 centre (320, 40.5) radius 2.75 projected
  circle A15 centre (260, 40.5) radius 2.75 projected
  circle A16 centre (-380, 40.5) radius 2.75 projected
  circle A17 centre (-320, 40.5) radius 2.75 projected
  circle A18 centre (-260, 40.5) radius 2.75 projected
  point P0 (0, 0)
extrude "Extrusion4" cut sketch "Sketch4" against normal through all
properties part number "Bumper Plate" material "Aluminum 6061"
